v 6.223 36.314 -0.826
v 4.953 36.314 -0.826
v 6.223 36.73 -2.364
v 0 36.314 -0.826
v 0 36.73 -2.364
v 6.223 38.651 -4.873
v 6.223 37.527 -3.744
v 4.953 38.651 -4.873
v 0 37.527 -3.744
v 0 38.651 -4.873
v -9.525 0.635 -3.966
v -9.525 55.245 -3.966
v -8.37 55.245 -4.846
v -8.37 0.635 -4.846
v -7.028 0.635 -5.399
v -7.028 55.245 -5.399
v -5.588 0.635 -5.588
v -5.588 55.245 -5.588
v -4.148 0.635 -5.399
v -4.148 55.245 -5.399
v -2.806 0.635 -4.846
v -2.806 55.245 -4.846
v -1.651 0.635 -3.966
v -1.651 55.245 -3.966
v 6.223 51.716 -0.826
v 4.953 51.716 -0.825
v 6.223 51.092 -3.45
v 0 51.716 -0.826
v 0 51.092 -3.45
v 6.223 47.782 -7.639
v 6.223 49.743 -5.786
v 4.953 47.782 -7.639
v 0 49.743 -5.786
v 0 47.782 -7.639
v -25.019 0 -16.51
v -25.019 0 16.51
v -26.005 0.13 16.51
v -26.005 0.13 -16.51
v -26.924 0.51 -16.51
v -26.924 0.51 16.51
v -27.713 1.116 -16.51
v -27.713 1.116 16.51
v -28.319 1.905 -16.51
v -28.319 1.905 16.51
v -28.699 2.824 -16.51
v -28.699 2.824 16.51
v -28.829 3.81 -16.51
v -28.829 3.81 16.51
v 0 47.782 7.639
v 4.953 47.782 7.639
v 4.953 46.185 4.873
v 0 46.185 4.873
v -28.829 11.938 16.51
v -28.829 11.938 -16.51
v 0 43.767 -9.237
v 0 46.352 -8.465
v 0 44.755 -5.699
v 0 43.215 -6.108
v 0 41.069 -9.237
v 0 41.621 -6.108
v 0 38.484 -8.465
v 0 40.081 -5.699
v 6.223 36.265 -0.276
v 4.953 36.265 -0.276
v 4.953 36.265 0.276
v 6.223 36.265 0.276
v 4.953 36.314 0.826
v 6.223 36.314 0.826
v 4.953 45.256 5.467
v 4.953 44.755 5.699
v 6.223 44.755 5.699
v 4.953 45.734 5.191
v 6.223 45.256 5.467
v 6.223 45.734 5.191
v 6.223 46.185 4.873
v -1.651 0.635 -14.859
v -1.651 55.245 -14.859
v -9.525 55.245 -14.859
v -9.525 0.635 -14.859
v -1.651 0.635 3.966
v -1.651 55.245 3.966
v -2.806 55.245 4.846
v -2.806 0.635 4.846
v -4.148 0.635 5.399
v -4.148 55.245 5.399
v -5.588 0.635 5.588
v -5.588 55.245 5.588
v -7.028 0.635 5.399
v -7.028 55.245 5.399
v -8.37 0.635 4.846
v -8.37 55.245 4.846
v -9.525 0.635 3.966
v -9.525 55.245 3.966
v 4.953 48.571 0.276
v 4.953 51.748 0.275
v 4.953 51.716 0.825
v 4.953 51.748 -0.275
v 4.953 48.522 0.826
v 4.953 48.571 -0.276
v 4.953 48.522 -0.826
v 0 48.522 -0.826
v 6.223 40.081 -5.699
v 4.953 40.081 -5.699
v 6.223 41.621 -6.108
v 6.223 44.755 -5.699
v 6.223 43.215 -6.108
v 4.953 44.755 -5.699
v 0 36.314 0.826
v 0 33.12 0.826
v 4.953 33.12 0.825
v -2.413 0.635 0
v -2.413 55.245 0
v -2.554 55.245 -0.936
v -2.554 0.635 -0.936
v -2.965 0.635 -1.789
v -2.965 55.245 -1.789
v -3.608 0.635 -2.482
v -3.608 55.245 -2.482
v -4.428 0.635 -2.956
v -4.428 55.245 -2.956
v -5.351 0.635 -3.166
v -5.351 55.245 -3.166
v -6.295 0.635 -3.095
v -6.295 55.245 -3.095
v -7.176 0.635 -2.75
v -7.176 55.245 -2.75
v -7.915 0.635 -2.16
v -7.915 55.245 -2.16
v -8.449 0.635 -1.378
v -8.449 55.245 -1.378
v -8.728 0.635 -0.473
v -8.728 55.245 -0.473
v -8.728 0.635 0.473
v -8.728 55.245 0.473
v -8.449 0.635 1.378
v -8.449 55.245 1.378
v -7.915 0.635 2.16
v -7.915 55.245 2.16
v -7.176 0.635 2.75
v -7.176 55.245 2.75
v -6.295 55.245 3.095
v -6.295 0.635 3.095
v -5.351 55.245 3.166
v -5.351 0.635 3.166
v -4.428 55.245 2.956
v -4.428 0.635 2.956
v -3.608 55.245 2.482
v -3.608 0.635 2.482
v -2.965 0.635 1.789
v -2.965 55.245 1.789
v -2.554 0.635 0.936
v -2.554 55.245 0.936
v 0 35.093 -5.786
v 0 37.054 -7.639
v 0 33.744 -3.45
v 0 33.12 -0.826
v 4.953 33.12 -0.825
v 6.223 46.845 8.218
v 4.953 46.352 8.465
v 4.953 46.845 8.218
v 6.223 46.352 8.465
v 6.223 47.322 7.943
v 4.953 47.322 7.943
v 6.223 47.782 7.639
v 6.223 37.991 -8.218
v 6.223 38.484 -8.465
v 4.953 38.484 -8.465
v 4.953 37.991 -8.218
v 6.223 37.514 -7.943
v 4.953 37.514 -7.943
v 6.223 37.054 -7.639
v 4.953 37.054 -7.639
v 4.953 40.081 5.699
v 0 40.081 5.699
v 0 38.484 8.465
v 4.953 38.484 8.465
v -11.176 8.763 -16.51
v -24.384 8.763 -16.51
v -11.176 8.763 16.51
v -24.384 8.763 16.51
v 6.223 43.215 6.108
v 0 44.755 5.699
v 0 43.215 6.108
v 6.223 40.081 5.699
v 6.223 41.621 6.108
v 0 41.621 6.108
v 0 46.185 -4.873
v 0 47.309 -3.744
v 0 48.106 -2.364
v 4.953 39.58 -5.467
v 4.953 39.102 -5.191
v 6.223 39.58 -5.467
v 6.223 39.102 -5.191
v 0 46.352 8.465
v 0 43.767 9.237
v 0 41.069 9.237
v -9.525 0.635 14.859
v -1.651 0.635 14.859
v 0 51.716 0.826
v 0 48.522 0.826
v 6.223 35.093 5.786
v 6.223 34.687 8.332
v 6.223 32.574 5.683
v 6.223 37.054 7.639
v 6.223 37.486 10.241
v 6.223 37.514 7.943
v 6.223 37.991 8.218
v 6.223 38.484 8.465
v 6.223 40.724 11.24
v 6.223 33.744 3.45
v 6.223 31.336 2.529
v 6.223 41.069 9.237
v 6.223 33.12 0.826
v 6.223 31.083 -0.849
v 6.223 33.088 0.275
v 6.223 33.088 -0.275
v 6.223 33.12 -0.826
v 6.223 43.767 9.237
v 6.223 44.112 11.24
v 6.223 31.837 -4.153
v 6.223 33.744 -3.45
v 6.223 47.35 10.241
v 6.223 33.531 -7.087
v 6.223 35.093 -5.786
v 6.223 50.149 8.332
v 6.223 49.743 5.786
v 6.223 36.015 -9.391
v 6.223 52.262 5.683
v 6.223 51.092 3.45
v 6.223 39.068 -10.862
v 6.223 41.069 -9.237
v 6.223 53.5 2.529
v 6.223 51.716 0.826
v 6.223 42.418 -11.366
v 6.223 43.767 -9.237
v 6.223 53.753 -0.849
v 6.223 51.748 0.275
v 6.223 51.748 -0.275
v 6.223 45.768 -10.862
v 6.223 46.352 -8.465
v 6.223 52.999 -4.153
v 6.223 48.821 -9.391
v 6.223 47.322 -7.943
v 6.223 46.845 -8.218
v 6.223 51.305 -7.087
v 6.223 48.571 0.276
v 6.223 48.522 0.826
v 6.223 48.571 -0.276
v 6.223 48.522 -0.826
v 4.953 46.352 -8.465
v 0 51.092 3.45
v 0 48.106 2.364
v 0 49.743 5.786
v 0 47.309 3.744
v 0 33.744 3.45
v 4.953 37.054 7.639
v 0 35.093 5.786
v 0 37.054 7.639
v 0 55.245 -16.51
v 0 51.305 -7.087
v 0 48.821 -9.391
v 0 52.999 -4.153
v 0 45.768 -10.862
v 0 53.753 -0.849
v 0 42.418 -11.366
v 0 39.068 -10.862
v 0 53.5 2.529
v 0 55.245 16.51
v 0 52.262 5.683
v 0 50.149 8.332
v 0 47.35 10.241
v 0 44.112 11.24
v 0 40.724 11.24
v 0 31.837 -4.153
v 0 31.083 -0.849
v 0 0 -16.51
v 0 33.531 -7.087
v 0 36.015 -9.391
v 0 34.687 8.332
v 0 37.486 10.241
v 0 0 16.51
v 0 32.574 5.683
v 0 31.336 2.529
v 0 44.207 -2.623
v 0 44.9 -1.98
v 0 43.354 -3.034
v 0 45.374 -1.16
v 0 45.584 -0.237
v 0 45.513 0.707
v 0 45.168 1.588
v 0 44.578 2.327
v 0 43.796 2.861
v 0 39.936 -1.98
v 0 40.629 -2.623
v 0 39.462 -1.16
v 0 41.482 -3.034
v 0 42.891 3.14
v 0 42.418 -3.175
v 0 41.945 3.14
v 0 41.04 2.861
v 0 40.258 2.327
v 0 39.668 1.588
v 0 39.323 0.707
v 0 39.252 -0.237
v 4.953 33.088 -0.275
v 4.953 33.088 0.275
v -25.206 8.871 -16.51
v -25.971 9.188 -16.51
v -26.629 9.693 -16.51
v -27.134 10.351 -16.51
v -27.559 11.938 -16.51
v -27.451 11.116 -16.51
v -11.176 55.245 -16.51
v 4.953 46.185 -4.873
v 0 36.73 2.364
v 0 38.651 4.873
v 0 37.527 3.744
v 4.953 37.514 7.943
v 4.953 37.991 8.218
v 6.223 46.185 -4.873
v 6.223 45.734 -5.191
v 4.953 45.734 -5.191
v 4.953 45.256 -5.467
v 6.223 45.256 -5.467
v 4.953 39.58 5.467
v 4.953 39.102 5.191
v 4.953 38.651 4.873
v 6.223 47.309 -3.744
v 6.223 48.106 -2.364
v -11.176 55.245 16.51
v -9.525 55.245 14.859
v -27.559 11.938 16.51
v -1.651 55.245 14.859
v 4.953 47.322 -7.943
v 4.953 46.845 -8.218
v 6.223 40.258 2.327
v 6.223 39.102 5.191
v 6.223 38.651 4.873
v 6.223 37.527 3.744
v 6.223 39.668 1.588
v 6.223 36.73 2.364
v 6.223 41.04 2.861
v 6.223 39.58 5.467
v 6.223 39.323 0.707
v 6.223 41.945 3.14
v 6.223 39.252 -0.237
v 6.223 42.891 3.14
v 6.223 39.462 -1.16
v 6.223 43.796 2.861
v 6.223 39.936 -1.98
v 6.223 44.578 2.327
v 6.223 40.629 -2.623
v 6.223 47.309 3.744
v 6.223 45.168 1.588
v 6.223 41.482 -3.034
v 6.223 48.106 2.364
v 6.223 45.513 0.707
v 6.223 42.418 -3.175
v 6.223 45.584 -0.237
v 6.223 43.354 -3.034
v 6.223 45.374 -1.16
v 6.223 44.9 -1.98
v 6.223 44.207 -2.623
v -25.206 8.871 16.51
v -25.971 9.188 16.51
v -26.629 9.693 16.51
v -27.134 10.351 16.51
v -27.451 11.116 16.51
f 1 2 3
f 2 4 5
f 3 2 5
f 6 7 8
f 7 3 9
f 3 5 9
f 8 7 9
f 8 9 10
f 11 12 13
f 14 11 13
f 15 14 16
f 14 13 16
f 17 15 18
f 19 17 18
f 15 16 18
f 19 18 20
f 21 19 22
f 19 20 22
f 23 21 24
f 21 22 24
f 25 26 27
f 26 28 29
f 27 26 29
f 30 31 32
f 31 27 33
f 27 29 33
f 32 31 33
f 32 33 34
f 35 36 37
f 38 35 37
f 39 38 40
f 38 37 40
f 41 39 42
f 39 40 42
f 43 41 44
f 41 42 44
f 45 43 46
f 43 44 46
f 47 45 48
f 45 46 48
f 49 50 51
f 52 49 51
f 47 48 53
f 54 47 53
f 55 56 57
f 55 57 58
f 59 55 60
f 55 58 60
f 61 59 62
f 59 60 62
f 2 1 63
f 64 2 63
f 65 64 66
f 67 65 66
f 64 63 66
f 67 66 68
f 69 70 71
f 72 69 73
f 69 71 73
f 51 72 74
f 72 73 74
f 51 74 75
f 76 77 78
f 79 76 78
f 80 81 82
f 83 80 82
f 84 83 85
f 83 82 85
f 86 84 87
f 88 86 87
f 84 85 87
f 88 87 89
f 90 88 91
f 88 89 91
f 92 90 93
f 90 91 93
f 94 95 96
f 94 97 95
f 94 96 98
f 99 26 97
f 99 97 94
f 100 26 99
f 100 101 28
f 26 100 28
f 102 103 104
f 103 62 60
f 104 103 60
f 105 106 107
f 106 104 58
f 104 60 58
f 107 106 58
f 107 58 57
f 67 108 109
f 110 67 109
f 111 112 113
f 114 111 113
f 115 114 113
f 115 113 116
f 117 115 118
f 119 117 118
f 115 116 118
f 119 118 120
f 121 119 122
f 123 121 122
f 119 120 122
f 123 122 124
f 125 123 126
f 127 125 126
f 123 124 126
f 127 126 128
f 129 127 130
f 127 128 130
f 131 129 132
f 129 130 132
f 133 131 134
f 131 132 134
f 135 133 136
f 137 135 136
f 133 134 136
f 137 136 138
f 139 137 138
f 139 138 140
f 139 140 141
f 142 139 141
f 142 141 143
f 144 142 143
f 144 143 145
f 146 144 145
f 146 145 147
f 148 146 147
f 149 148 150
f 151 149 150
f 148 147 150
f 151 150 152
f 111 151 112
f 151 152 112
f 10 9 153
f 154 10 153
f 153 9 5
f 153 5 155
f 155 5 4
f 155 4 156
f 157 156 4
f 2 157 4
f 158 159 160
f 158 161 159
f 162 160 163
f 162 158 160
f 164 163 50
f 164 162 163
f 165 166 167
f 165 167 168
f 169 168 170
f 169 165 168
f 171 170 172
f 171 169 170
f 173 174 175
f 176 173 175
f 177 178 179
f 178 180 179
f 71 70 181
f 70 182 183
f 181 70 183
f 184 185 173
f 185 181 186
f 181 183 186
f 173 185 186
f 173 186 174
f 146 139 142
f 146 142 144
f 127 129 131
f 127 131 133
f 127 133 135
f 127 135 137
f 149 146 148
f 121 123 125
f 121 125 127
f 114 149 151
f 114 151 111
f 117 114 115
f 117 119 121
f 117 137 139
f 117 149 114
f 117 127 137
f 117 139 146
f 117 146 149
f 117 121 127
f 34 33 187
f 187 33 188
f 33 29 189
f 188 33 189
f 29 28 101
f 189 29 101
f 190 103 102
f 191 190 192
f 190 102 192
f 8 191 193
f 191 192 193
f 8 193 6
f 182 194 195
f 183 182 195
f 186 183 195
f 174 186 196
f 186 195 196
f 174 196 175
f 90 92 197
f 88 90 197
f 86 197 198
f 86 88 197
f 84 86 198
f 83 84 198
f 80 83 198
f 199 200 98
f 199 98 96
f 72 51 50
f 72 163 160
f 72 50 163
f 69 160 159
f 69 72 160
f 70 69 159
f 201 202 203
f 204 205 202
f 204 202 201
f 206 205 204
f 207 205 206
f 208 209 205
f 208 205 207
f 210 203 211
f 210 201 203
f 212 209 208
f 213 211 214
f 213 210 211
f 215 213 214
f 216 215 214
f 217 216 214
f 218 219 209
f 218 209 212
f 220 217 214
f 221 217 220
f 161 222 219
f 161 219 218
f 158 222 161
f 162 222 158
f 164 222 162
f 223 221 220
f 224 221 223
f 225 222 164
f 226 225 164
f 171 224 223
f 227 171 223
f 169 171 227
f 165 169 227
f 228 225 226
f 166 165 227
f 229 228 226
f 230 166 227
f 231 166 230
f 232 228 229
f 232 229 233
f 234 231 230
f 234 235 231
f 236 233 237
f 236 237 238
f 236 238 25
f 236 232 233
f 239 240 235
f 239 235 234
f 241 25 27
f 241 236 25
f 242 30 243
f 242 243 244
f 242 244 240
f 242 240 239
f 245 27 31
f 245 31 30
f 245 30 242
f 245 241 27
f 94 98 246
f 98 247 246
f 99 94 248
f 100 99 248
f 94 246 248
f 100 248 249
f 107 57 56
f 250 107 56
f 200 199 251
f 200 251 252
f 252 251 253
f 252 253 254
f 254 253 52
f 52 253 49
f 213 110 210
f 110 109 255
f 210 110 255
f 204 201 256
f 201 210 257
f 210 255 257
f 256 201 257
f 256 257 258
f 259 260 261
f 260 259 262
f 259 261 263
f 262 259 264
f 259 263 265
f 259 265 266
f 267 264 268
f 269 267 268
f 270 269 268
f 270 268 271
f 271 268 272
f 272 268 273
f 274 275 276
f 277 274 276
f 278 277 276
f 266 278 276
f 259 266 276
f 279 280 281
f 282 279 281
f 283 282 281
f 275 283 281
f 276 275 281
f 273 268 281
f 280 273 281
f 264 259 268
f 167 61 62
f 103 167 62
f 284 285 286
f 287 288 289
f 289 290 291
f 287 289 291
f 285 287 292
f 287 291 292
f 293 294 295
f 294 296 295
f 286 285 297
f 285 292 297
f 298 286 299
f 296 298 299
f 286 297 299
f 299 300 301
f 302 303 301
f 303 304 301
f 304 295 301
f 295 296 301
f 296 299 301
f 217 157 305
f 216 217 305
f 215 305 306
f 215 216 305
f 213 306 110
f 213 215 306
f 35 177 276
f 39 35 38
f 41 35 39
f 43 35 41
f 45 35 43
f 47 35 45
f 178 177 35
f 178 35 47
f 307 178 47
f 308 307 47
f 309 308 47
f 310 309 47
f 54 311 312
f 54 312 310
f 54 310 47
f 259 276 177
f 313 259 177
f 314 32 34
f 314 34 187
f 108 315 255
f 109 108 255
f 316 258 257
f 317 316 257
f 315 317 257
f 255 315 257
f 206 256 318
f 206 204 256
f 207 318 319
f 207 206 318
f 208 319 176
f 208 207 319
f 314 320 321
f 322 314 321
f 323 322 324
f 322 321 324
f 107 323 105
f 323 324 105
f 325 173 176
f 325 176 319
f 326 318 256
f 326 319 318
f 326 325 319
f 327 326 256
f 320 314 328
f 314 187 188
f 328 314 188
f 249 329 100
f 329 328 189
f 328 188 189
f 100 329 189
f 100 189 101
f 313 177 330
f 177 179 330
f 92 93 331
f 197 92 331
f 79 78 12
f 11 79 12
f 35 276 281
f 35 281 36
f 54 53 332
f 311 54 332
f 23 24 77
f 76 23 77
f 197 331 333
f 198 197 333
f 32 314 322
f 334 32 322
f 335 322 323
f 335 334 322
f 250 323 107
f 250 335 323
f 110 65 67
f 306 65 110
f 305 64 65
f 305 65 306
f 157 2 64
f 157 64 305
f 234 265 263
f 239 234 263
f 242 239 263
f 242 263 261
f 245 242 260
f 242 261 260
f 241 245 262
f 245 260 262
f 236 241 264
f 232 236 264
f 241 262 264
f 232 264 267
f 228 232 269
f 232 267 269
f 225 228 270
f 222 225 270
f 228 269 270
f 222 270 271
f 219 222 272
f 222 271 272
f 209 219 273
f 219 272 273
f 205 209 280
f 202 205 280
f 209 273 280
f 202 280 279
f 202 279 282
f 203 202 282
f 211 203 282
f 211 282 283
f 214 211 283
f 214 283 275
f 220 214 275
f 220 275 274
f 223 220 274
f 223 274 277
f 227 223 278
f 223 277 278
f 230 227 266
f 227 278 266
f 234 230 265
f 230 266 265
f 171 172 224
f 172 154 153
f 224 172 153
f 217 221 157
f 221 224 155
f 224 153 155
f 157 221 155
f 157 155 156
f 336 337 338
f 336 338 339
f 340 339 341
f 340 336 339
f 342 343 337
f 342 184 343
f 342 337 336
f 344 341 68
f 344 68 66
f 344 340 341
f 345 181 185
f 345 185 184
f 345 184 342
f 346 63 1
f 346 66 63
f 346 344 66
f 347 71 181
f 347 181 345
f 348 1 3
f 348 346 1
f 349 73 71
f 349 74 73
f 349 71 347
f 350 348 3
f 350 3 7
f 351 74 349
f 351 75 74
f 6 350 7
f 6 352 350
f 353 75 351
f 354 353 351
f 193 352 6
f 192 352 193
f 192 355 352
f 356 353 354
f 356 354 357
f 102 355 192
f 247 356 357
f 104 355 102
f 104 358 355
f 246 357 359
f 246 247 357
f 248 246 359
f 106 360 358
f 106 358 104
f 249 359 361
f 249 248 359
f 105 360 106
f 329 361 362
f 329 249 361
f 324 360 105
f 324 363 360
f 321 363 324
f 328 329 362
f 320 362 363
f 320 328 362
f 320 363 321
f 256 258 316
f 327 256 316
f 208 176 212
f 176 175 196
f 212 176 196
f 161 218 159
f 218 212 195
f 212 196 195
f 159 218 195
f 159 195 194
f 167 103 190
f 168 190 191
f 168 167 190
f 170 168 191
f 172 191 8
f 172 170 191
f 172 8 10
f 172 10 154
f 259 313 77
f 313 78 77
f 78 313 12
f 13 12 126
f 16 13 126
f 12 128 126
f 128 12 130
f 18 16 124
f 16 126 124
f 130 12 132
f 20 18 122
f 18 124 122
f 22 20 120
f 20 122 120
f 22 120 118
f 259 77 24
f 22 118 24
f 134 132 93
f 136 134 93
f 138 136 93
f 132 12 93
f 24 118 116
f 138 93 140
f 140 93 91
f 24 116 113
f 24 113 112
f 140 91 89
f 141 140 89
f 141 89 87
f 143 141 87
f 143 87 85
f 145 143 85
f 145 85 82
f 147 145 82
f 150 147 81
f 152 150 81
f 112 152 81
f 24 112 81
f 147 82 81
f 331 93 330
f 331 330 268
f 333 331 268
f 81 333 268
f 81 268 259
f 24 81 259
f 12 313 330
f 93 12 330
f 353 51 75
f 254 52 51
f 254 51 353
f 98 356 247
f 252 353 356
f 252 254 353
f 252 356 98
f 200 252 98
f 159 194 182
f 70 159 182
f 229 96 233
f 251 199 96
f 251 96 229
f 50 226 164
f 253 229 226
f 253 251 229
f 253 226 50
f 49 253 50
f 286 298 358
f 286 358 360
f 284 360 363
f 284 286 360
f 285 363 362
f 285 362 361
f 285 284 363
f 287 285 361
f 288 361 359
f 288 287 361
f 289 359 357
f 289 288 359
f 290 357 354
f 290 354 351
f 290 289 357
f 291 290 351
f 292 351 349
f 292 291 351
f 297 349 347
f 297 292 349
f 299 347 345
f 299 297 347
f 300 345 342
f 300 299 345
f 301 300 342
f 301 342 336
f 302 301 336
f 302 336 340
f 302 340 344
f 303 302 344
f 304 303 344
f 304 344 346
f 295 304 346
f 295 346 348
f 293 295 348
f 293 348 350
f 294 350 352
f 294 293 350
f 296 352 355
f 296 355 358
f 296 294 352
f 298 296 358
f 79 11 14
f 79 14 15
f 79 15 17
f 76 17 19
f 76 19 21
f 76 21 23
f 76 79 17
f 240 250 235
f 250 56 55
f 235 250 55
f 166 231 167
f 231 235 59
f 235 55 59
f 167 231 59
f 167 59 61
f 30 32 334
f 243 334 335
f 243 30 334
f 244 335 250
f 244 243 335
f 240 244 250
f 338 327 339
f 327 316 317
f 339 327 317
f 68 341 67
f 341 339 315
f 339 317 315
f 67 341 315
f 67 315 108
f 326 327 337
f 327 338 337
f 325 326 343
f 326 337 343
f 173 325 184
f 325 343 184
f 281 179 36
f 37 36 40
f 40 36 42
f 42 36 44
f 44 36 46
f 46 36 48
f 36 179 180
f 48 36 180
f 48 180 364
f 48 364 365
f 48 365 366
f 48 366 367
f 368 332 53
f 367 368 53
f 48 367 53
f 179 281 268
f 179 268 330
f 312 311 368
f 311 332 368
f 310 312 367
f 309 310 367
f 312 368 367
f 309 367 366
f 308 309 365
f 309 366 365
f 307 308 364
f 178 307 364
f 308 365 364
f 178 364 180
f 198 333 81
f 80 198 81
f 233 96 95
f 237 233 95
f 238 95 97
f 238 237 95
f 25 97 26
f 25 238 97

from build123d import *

# Parameters (mm, degrees)
BOSS_EXTRUDE1_DEPTH = 16.51
SKETCH2_R           = 11.3665
SKETCH2_R_2         = 3.175
BOSS_EXTRUDE2_DEPTH = 6.223
SKETCH3_W           = 1.27
SKETCH3_H           = 3.175
SKETCH4_R           = 3.175
CUT_EXTRUDE1_DEPTH  = 54.61


with BuildPart() as part:
    # Sketch1 → Boss-Extrude1 (new body, symmetric)
    with BuildSketch(Plane.XY):
        with BuildLine():
            Line((-28.829, 11.938), (-27.559, 11.938))
            ThreePointArc((-27.559, 11.938), (-26.62906403, 9.69293597), (-24.384, 8.763))
            Line((-24.384, 8.763), (-11.176, 8.763))
            Line((-11.176, 8.763), (-11.176, 55.245))
            Line((-11.176, 55.245), (0, 55.245))
            Line((0, 55.245), (0, 0))
            Line((0, 0), (-25.019, 0))
            ThreePointArc((-25.019, 0), (-27.713076836, 1.115923164), (-28.829, 3.81))
            Line((-28.829, 3.81), (-28.829, 11.938))
        make_face()
    extrude(amount=BOSS_EXTRUDE1_DEPTH, both=True)

    # Sketch2 → Boss-Extrude2 (add)
    with BuildSketch(Plane(origin=(0, 0, 0), x_dir=(0, 0, -1), z_dir=(1, 0, 0))):
        with Locations((0, 42.418)):
            Circle(SKETCH2_R)
        with Locations((0, 42.418)):
            Circle(SKETCH2_R_2, mode=Mode.SUBTRACT)
        with BuildLine():
            Line((-0.8255, 48.521932339), (-0.8255, 51.715926651))
            ThreePointArc((-0.8255, 51.715926651), (-4.66725, 50.501914132), (-7.639490682, 47.781867296))
            Line((-7.639490682, 47.781867296), (-4.873410469, 46.18487014))
            ThreePointArc((-4.873410469, 46.18487014), (-3.07975, 47.752283475), (-0.8255, 48.521932339))
        make_face(mode=Mode.SUBTRACT)
        with BuildLine():
            Line((0.8255, 48.521932339), (0.8255, 51.715926651))
            ThreePointArc((0.8255, 51.715926651), (4.66725, 50.501914132), (7.639490682, 47.781867296))
            Line((7.639490682, 47.781867296), (4.873410469, 46.18487014))
            ThreePointArc((4.873410469, 46.18487014), (3.07975, 47.752283475), (0.8255, 48.521932339))
        make_face(mode=Mode.SUBTRACT)
        with BuildLine():
            Line((5.698910469, 44.755062199), (8.464990682, 46.352059354))
            ThreePointArc((8.464990682, 46.352059354), (9.3345, 42.418), (8.464990682, 38.483940646))
            Line((8.464990682, 38.483940646), (5.698910469, 40.080937801))
            ThreePointArc((5.698910469, 40.080937801), (6.1595, 42.418), (5.698910469, 44.755062199))
        make_face(mode=Mode.SUBTRACT)
        with BuildLine():
            Line((4.873410469, 38.65112986), (7.639490682, 37.054132704))
            ThreePointArc((7.639490682, 37.054132704), (4.66725, 34.334085868), (0.8255, 33.120073349))
            Line((0.8255, 33.120073349), (0.8255, 36.314067661))
            ThreePointArc((0.8255, 36.314067661), (3.07975, 37.083716525), (4.873410469, 38.65112986))
        make_face(mode=Mode.SUBTRACT)
        with BuildLine():
            Line((-0.8255, 36.314067661), (-0.8255, 33.120073349))
            ThreePointArc((-0.8255, 33.120073349), (-4.66725, 34.334085868), (-7.639490682, 37.054132704))
            Line((-7.639490682, 37.054132704), (-4.873410469, 38.65112986))
            ThreePointArc((-4.873410469, 38.65112986), (-3.07975, 37.083716525), (-0.8255, 36.314067661))
        make_face(mode=Mode.SUBTRACT)
        with BuildLine():
            Line((-5.698910469, 40.080937801), (-8.464990682, 38.483940646))
            ThreePointArc((-8.464990682, 38.483940646), (-9.3345, 42.418), (-8.464990682, 46.352059354))
            Line((-8.464990682, 46.352059354), (-5.698910469, 44.755062199))
            ThreePointArc((-5.698910469, 44.755062199), (-6.1595, 42.418), (-5.698910469, 40.080937801))
        make_face(mode=Mode.SUBTRACT)
    extrude(amount=BOSS_EXTRUDE2_DEPTH)

    # Sketch3 → Cut-Revolve1 (revolve, cut)
    with BuildSketch(Plane.XY):
        with Locations((5.588, 50.165)):
            Rectangle(SKETCH3_W, SKETCH3_H)
    revolve(axis=Axis((6.223, 42.418, 0), (-1, 0, 0)), mode=Mode.SUBTRACT)

    # Sketch4 → Cut-Extrude1 (cut)
    with BuildSketch(Plane(origin=(0, 55.245, 0), x_dir=(1, 0, 0), z_dir=(0, 1, 0))):
        with BuildLine():
            Line((-1.651, 3.965573729), (-1.651, 14.859))
            Line((-1.651, 14.859), (-9.525, 14.859))
            Line((-9.525, 14.859), (-9.525, 3.965573729))
            ThreePointArc((-9.525, 3.965573729), (-5.588, 5.588), (-1.651, 3.965573729))
        make_face()
        with BuildLine():
            Line((-1.651, -14.859), (-1.651, -3.965573729))
            ThreePointArc((-1.651, -3.965573729), (-5.588, -5.588), (-9.525, -3.965573729))
            Line((-9.525, -3.965573729), (-9.525, -14.859))
            Line((-9.525, -14.859), (-1.651, -14.859))
        make_face()
        with Locations((-5.588, 0)):
            Circle(SKETCH4_R)
    extrude(amount=-CUT_EXTRUDE1_DEPTH, mode=Mode.SUBTRACT)


solid = part.part
